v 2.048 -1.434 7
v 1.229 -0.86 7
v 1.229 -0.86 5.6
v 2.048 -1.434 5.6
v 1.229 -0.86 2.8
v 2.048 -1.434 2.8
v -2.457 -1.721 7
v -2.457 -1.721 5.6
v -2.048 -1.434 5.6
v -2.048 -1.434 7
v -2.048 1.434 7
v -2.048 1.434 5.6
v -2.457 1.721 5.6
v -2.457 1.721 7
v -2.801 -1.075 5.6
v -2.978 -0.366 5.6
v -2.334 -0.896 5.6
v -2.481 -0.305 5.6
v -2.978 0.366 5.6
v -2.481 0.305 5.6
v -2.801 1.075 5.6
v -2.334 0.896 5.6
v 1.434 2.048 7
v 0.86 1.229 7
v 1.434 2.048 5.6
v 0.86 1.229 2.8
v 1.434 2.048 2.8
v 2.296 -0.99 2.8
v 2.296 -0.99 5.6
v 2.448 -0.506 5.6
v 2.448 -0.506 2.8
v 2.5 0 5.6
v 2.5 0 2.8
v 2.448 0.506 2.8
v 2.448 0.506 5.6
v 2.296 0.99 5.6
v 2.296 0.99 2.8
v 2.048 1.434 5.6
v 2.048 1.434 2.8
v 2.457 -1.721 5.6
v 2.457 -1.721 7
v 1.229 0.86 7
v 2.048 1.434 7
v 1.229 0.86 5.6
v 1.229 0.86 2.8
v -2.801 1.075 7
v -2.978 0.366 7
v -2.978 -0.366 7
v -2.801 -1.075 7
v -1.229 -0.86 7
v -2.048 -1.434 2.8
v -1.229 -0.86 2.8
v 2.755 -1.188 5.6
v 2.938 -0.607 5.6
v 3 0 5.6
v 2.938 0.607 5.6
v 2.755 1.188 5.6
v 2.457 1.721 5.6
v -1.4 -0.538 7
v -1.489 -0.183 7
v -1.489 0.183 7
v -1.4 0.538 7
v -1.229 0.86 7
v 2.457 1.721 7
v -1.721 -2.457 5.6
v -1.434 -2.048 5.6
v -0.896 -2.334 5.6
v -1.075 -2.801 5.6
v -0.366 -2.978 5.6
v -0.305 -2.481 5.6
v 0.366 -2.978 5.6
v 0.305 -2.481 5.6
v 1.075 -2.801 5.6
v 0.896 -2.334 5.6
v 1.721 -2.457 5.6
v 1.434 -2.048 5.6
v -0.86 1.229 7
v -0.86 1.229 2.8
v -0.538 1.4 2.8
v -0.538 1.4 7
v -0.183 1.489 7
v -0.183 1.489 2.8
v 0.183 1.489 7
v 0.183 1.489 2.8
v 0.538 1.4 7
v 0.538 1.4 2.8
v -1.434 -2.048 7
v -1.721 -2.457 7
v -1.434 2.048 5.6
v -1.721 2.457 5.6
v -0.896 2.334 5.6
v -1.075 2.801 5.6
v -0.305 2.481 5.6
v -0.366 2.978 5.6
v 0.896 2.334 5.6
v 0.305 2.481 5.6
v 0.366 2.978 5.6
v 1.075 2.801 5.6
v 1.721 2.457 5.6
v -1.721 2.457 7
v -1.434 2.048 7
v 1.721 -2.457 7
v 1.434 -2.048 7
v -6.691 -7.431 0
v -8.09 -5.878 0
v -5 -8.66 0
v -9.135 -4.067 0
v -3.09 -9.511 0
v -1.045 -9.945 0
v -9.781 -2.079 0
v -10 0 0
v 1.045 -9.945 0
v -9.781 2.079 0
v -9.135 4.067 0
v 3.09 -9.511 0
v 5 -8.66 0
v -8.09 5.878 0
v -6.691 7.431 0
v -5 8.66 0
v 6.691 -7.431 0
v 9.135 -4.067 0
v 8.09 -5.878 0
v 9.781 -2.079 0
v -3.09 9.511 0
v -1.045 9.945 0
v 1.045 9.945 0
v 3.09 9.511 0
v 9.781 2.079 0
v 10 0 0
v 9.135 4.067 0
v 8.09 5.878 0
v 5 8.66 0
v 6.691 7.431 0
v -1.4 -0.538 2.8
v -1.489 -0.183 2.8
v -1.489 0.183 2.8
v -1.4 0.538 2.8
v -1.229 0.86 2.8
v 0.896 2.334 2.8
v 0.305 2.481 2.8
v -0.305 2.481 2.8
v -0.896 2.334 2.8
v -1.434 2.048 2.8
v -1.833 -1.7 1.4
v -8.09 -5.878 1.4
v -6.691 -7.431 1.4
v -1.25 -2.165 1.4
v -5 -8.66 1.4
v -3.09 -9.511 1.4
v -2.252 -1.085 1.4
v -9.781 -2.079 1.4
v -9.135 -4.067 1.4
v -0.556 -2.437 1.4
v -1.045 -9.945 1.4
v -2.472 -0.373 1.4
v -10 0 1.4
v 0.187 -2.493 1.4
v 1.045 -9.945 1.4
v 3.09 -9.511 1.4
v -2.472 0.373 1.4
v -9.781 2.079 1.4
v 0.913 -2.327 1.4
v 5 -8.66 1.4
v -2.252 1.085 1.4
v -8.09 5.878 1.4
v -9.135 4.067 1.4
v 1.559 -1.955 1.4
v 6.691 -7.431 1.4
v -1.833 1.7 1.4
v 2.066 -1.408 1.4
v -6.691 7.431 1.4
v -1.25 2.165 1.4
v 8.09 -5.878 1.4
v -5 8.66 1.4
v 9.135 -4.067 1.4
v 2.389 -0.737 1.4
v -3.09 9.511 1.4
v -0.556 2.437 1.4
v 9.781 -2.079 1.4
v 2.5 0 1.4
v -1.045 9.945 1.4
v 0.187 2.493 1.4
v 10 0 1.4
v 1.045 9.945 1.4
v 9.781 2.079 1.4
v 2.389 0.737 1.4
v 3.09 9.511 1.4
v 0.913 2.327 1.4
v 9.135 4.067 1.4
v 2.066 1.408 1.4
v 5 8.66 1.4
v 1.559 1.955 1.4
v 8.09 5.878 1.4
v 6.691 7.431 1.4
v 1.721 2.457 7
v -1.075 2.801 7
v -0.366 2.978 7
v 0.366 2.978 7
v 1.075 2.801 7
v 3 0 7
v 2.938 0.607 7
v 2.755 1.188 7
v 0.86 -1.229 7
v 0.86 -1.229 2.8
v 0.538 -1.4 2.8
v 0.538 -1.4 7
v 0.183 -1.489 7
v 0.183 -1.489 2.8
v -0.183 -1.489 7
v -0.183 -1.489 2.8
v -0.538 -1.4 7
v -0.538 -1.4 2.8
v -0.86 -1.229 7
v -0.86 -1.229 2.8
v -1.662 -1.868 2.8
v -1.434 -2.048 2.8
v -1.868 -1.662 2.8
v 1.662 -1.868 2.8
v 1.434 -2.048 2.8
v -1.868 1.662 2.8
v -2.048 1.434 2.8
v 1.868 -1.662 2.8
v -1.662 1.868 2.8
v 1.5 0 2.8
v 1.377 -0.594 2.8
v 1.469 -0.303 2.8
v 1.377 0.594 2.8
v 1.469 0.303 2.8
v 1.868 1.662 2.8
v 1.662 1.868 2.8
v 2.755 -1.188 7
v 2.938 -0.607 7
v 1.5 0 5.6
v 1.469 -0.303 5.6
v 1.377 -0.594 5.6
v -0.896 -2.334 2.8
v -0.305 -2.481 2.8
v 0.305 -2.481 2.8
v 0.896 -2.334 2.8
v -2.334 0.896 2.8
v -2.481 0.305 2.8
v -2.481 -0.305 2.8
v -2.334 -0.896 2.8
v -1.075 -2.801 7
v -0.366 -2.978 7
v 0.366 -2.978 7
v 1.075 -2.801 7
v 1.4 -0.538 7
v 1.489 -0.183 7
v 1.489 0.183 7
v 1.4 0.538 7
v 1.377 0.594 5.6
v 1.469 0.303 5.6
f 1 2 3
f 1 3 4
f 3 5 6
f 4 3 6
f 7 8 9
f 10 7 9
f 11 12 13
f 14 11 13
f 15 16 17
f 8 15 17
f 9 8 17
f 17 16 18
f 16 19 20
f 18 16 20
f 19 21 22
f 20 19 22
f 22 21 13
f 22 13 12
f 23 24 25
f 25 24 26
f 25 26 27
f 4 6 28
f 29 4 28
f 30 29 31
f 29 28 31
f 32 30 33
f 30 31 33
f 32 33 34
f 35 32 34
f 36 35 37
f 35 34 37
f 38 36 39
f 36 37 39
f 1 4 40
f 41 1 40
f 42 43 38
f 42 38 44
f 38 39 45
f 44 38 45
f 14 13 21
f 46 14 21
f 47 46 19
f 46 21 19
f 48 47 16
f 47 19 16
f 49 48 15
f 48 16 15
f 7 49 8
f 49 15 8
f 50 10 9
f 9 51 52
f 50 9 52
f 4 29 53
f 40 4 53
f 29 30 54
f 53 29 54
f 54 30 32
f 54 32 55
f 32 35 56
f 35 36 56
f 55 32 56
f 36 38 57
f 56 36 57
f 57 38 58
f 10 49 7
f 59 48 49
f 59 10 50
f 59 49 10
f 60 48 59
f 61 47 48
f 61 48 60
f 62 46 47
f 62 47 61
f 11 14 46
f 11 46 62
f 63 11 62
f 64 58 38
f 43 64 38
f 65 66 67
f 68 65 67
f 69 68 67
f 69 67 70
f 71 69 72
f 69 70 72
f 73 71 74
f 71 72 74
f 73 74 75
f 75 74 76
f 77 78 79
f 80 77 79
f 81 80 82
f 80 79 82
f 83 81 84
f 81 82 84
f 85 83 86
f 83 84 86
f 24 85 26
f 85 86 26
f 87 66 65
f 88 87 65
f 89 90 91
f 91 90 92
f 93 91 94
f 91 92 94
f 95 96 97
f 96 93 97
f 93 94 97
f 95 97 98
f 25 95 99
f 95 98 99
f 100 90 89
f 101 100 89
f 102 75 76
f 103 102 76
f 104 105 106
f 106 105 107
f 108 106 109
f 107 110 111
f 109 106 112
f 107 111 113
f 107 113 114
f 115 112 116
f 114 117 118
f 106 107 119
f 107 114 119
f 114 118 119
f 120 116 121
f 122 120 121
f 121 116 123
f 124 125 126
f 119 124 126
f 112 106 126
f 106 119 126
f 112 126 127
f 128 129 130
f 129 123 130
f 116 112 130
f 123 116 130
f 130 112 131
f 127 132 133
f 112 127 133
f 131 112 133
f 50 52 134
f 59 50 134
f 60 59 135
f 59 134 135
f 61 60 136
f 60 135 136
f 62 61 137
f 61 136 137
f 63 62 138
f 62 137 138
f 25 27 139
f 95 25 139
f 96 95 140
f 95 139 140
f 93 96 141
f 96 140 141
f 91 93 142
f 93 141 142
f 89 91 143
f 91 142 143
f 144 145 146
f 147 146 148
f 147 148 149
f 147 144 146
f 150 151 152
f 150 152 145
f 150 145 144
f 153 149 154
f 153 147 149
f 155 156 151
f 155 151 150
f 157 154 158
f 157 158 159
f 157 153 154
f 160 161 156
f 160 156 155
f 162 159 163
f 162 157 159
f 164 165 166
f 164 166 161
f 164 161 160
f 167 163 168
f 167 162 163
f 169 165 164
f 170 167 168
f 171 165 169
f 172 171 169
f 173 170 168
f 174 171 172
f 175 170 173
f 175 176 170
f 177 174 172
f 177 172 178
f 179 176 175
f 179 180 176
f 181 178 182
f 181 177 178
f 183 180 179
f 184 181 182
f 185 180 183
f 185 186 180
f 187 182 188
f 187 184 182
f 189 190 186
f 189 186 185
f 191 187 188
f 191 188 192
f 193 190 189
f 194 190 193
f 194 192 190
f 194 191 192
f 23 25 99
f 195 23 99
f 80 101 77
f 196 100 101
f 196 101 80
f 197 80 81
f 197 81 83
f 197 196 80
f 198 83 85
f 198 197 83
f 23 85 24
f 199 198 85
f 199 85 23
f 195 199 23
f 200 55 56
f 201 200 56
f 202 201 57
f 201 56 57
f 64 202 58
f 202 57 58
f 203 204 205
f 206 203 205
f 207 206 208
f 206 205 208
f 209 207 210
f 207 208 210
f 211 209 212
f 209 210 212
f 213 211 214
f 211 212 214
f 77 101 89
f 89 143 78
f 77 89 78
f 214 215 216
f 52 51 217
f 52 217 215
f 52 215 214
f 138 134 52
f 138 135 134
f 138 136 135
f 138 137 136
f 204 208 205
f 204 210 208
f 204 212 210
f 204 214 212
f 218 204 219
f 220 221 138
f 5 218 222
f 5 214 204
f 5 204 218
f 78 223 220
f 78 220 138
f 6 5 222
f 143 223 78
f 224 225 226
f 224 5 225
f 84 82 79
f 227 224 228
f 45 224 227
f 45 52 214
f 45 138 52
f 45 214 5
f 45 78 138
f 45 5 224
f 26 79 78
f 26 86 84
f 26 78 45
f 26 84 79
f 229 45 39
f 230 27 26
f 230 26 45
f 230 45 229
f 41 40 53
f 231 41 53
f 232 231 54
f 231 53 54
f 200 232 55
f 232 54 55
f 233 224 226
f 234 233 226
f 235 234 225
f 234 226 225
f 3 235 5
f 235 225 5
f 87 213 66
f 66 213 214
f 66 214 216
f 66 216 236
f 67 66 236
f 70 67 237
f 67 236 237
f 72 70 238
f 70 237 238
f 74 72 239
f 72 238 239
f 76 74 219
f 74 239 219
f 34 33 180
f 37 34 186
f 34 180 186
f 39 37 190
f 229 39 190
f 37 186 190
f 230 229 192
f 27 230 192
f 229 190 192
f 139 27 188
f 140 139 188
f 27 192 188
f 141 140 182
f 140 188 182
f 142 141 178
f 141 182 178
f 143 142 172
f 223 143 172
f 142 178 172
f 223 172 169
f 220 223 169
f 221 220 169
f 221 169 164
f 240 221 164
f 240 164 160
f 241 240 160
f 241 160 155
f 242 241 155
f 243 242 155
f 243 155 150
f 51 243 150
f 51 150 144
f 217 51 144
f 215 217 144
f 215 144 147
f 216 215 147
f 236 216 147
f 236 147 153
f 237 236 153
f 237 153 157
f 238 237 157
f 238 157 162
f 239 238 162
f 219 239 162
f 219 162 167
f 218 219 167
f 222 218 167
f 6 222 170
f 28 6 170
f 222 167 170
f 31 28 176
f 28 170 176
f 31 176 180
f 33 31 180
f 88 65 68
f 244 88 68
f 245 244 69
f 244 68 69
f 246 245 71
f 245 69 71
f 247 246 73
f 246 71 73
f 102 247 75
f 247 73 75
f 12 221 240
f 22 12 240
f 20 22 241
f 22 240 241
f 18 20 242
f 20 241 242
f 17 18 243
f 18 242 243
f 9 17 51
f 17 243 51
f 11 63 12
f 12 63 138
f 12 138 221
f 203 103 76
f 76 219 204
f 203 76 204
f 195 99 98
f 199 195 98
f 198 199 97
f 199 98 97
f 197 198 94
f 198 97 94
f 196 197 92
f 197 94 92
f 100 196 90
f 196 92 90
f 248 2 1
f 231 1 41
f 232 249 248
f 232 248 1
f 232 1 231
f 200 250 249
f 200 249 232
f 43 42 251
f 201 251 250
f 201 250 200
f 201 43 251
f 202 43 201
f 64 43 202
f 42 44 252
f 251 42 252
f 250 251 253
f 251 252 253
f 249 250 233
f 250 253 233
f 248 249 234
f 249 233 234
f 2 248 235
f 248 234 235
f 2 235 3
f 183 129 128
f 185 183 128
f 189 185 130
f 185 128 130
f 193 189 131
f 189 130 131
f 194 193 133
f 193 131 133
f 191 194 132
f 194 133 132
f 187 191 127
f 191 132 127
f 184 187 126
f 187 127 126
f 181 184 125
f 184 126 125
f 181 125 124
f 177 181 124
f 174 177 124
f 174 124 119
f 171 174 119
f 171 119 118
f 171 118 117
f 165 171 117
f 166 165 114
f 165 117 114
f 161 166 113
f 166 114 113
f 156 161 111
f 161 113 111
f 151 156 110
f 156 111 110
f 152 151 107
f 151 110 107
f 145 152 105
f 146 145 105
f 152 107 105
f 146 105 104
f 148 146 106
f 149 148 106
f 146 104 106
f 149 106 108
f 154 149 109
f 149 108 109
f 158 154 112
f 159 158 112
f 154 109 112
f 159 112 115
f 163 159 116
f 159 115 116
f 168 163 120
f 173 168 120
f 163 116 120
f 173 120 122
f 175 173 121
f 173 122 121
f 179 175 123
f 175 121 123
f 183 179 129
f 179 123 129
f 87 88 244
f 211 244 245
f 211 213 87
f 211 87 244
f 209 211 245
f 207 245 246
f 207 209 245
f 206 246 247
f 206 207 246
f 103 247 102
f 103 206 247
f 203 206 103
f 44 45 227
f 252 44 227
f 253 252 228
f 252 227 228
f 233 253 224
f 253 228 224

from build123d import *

# Parameters (mm, degrees)
F0_R     = 10
F1_DEPTH = 1.4
F2_R     = 2.5
F3_DEPTH = 1.4
F5_DEPTH = 2.8
F7_DEPTH = 1.4


with BuildPart() as f1:
    # F0 (on Top) → F1 (new body)
    with BuildSketch(Plane.XY):
        Circle(F0_R)
    extrude(amount=F1_DEPTH)

    # F2 (on face) → F3 (join)
    with BuildSketch(Plane.XY.offset(1.4)):
        Circle(F2_R)
    extrude(amount=F3_DEPTH)

    # F4 (on face) → F5 (join)
    with BuildSketch(Plane.XY.offset(2.8)):
        with BuildLine():
            Line((-2.0478801107, -1.4339410909), (-1.2287280664, -0.8603646545))
            ThreePointArc((-1.2287280664, -0.8603646545), (-1.5, 0), (-1.2287280664, 0.8603646545))
            Line((-1.2287280664, 0.8603646545), (-2.0478801107, 1.4339410909))
            ThreePointArc((-2.0478801107, 1.4339410909), (-2.5, 0), (-2.0478801107, -1.4339410909))
        make_face()
        with BuildLine():
            ThreePointArc((-0.8603646545, 1.2287280664), (0, 1.5), (0.8603646545, 1.2287280664))
            Line((0.8603646545, 1.2287280664), (1.4339410909, 2.0478801107))
            ThreePointArc((1.4339410909, 2.0478801107), (0, 2.5), (-1.4339410909, 2.0478801107))
            Line((-1.4339410909, 2.0478801107), (-0.8603646545, 1.2287280664))
        make_face()
        with BuildLine():
            ThreePointArc((1.2287280664, 0.8603646545), (1.4305754261, 0.4510586993), (1.5, 0))
            ThreePointArc((1.5, 0), (1.4305754261, -0.4510586993), (1.2287280664, -0.8603646545))
            Line((1.2287280664, -0.8603646545), (2.0478801107, -1.4339410909))
            ThreePointArc((2.0478801107, -1.4339410909), (2.3842923769, -0.7517644988), (2.5, 0))
            ThreePointArc((2.5, 0), (2.3842923769, 0.7517644988), (2.0478801107, 1.4339410909))
            Line((2.0478801107, 1.4339410909), (1.2287280664, 0.8603646545))
        make_face()
        with BuildLine():
            Line((1.4339410909, -2.0478801107), (0.8603646545, -1.2287280664))
            ThreePointArc((0.8603646545, -1.2287280664), (0, -1.5), (-0.8603646545, -1.2287280664))
            Line((-0.8603646545, -1.2287280664), (-1.4339410909, -2.0478801107))
            ThreePointArc((-1.4339410909, -2.0478801107), (0, -2.5), (1.4339410909, -2.0478801107))
        make_face()
    extrude(amount=F5_DEPTH)

    # F6 (on face) → F7 (join)
    with BuildSketch(Plane.XY.offset(5.6)):
        with BuildLine():
            ThreePointArc((-0.8603646545, 1.2287280664), (0, 1.5), (0.8603646545, 1.2287280664))
            Line((0.8603646545, 1.2287280664), (1.4339410909, 2.0478801107))
            ThreePointArc((1.4339410909, 2.0478801107), (0, 2.5), (-1.4339410909, 2.0478801107))
            Line((-1.4339410909, 2.0478801107), (-0.8603646545, 1.2287280664))
        make_face()
        with BuildLine():
            ThreePointArc((-1.4339410909, 2.0478801107), (0, 2.5), (1.4339410909, 2.0478801107))
            Line((1.4339410909, 2.0478801107), (1.7207293091, 2.4574561329))
            ThreePointArc((1.7207293091, 2.4574561329), (0, 3), (-1.7207293091, 2.4574561329))
            Line((-1.7207293091, 2.4574561329), (-1.4339410909, 2.0478801107))
        make_face()
        with BuildLine():
            ThreePointArc((3, 0), (2.8611508522, 0.9021173985), (2.4574561329, 1.7207293091))
            Line((2.4574561329, 1.7207293091), (2.0478801107, 1.4339410909))
            Line((2.0478801107, 1.4339410909), (1.2287280664, 0.8603646545))
            ThreePointArc((1.2287280664, 0.8603646545), (1.5, 0), (1.2287280664, -0.8603646545))
            Line((1.2287280664, -0.8603646545), (2.0478801107, -1.4339410909))
            Line((2.0478801107, -1.4339410909), (2.4574561329, -1.7207293091))
            ThreePointArc((2.4574561329, -1.7207293091), (2.8611508522, -0.9021173985), (3, 0))
        make_face()
        with BuildLine():
            Line((-2.0478801107, 1.4339410909), (-2.4574561329, 1.7207293091))
            ThreePointArc((-2.4574561329, 1.7207293091), (-3, 0), (-2.4574561329, -1.7207293091))
            Line((-2.4574561329, -1.7207293091), (-2.0478801107, -1.4339410909))
            ThreePointArc((-2.0478801107, -1.4339410909), (-2.5, 0), (-2.0478801107, 1.4339410909))
        make_face()
        with BuildLine():
            Line((-1.2287280664, 0.8603646545), (-2.0478801107, 1.4339410909))
            ThreePointArc((-2.0478801107, 1.4339410909), (-2.5, 0), (-2.0478801107, -1.4339410909))
            Line((-2.0478801107, -1.4339410909), (-1.2287280664, -0.8603646545))
            ThreePointArc((-1.2287280664, -0.8603646545), (-1.5, 0), (-1.2287280664, 0.8603646545))
        make_face()
        with BuildLine():
            Line((-1.4339410909, -2.0478801107), (-1.7207293091, -2.4574561329))
            ThreePointArc((-1.7207293091, -2.4574561329), (0, -3), (1.7207293091, -2.4574561329))
            Line((1.7207293091, -2.4574561329), (1.4339410909, -2.0478801107))
            Line((1.4339410909, -2.0478801107), (0.8603646545, -1.2287280664))
            ThreePointArc((0.8603646545, -1.2287280664), (0, -1.5), (-0.8603646545, -1.2287280664))
            Line((-0.8603646545, -1.2287280664), (-1.4339410909, -2.0478801107))
        make_face()
    extrude(amount=F7_DEPTH)


solid = f1.part
